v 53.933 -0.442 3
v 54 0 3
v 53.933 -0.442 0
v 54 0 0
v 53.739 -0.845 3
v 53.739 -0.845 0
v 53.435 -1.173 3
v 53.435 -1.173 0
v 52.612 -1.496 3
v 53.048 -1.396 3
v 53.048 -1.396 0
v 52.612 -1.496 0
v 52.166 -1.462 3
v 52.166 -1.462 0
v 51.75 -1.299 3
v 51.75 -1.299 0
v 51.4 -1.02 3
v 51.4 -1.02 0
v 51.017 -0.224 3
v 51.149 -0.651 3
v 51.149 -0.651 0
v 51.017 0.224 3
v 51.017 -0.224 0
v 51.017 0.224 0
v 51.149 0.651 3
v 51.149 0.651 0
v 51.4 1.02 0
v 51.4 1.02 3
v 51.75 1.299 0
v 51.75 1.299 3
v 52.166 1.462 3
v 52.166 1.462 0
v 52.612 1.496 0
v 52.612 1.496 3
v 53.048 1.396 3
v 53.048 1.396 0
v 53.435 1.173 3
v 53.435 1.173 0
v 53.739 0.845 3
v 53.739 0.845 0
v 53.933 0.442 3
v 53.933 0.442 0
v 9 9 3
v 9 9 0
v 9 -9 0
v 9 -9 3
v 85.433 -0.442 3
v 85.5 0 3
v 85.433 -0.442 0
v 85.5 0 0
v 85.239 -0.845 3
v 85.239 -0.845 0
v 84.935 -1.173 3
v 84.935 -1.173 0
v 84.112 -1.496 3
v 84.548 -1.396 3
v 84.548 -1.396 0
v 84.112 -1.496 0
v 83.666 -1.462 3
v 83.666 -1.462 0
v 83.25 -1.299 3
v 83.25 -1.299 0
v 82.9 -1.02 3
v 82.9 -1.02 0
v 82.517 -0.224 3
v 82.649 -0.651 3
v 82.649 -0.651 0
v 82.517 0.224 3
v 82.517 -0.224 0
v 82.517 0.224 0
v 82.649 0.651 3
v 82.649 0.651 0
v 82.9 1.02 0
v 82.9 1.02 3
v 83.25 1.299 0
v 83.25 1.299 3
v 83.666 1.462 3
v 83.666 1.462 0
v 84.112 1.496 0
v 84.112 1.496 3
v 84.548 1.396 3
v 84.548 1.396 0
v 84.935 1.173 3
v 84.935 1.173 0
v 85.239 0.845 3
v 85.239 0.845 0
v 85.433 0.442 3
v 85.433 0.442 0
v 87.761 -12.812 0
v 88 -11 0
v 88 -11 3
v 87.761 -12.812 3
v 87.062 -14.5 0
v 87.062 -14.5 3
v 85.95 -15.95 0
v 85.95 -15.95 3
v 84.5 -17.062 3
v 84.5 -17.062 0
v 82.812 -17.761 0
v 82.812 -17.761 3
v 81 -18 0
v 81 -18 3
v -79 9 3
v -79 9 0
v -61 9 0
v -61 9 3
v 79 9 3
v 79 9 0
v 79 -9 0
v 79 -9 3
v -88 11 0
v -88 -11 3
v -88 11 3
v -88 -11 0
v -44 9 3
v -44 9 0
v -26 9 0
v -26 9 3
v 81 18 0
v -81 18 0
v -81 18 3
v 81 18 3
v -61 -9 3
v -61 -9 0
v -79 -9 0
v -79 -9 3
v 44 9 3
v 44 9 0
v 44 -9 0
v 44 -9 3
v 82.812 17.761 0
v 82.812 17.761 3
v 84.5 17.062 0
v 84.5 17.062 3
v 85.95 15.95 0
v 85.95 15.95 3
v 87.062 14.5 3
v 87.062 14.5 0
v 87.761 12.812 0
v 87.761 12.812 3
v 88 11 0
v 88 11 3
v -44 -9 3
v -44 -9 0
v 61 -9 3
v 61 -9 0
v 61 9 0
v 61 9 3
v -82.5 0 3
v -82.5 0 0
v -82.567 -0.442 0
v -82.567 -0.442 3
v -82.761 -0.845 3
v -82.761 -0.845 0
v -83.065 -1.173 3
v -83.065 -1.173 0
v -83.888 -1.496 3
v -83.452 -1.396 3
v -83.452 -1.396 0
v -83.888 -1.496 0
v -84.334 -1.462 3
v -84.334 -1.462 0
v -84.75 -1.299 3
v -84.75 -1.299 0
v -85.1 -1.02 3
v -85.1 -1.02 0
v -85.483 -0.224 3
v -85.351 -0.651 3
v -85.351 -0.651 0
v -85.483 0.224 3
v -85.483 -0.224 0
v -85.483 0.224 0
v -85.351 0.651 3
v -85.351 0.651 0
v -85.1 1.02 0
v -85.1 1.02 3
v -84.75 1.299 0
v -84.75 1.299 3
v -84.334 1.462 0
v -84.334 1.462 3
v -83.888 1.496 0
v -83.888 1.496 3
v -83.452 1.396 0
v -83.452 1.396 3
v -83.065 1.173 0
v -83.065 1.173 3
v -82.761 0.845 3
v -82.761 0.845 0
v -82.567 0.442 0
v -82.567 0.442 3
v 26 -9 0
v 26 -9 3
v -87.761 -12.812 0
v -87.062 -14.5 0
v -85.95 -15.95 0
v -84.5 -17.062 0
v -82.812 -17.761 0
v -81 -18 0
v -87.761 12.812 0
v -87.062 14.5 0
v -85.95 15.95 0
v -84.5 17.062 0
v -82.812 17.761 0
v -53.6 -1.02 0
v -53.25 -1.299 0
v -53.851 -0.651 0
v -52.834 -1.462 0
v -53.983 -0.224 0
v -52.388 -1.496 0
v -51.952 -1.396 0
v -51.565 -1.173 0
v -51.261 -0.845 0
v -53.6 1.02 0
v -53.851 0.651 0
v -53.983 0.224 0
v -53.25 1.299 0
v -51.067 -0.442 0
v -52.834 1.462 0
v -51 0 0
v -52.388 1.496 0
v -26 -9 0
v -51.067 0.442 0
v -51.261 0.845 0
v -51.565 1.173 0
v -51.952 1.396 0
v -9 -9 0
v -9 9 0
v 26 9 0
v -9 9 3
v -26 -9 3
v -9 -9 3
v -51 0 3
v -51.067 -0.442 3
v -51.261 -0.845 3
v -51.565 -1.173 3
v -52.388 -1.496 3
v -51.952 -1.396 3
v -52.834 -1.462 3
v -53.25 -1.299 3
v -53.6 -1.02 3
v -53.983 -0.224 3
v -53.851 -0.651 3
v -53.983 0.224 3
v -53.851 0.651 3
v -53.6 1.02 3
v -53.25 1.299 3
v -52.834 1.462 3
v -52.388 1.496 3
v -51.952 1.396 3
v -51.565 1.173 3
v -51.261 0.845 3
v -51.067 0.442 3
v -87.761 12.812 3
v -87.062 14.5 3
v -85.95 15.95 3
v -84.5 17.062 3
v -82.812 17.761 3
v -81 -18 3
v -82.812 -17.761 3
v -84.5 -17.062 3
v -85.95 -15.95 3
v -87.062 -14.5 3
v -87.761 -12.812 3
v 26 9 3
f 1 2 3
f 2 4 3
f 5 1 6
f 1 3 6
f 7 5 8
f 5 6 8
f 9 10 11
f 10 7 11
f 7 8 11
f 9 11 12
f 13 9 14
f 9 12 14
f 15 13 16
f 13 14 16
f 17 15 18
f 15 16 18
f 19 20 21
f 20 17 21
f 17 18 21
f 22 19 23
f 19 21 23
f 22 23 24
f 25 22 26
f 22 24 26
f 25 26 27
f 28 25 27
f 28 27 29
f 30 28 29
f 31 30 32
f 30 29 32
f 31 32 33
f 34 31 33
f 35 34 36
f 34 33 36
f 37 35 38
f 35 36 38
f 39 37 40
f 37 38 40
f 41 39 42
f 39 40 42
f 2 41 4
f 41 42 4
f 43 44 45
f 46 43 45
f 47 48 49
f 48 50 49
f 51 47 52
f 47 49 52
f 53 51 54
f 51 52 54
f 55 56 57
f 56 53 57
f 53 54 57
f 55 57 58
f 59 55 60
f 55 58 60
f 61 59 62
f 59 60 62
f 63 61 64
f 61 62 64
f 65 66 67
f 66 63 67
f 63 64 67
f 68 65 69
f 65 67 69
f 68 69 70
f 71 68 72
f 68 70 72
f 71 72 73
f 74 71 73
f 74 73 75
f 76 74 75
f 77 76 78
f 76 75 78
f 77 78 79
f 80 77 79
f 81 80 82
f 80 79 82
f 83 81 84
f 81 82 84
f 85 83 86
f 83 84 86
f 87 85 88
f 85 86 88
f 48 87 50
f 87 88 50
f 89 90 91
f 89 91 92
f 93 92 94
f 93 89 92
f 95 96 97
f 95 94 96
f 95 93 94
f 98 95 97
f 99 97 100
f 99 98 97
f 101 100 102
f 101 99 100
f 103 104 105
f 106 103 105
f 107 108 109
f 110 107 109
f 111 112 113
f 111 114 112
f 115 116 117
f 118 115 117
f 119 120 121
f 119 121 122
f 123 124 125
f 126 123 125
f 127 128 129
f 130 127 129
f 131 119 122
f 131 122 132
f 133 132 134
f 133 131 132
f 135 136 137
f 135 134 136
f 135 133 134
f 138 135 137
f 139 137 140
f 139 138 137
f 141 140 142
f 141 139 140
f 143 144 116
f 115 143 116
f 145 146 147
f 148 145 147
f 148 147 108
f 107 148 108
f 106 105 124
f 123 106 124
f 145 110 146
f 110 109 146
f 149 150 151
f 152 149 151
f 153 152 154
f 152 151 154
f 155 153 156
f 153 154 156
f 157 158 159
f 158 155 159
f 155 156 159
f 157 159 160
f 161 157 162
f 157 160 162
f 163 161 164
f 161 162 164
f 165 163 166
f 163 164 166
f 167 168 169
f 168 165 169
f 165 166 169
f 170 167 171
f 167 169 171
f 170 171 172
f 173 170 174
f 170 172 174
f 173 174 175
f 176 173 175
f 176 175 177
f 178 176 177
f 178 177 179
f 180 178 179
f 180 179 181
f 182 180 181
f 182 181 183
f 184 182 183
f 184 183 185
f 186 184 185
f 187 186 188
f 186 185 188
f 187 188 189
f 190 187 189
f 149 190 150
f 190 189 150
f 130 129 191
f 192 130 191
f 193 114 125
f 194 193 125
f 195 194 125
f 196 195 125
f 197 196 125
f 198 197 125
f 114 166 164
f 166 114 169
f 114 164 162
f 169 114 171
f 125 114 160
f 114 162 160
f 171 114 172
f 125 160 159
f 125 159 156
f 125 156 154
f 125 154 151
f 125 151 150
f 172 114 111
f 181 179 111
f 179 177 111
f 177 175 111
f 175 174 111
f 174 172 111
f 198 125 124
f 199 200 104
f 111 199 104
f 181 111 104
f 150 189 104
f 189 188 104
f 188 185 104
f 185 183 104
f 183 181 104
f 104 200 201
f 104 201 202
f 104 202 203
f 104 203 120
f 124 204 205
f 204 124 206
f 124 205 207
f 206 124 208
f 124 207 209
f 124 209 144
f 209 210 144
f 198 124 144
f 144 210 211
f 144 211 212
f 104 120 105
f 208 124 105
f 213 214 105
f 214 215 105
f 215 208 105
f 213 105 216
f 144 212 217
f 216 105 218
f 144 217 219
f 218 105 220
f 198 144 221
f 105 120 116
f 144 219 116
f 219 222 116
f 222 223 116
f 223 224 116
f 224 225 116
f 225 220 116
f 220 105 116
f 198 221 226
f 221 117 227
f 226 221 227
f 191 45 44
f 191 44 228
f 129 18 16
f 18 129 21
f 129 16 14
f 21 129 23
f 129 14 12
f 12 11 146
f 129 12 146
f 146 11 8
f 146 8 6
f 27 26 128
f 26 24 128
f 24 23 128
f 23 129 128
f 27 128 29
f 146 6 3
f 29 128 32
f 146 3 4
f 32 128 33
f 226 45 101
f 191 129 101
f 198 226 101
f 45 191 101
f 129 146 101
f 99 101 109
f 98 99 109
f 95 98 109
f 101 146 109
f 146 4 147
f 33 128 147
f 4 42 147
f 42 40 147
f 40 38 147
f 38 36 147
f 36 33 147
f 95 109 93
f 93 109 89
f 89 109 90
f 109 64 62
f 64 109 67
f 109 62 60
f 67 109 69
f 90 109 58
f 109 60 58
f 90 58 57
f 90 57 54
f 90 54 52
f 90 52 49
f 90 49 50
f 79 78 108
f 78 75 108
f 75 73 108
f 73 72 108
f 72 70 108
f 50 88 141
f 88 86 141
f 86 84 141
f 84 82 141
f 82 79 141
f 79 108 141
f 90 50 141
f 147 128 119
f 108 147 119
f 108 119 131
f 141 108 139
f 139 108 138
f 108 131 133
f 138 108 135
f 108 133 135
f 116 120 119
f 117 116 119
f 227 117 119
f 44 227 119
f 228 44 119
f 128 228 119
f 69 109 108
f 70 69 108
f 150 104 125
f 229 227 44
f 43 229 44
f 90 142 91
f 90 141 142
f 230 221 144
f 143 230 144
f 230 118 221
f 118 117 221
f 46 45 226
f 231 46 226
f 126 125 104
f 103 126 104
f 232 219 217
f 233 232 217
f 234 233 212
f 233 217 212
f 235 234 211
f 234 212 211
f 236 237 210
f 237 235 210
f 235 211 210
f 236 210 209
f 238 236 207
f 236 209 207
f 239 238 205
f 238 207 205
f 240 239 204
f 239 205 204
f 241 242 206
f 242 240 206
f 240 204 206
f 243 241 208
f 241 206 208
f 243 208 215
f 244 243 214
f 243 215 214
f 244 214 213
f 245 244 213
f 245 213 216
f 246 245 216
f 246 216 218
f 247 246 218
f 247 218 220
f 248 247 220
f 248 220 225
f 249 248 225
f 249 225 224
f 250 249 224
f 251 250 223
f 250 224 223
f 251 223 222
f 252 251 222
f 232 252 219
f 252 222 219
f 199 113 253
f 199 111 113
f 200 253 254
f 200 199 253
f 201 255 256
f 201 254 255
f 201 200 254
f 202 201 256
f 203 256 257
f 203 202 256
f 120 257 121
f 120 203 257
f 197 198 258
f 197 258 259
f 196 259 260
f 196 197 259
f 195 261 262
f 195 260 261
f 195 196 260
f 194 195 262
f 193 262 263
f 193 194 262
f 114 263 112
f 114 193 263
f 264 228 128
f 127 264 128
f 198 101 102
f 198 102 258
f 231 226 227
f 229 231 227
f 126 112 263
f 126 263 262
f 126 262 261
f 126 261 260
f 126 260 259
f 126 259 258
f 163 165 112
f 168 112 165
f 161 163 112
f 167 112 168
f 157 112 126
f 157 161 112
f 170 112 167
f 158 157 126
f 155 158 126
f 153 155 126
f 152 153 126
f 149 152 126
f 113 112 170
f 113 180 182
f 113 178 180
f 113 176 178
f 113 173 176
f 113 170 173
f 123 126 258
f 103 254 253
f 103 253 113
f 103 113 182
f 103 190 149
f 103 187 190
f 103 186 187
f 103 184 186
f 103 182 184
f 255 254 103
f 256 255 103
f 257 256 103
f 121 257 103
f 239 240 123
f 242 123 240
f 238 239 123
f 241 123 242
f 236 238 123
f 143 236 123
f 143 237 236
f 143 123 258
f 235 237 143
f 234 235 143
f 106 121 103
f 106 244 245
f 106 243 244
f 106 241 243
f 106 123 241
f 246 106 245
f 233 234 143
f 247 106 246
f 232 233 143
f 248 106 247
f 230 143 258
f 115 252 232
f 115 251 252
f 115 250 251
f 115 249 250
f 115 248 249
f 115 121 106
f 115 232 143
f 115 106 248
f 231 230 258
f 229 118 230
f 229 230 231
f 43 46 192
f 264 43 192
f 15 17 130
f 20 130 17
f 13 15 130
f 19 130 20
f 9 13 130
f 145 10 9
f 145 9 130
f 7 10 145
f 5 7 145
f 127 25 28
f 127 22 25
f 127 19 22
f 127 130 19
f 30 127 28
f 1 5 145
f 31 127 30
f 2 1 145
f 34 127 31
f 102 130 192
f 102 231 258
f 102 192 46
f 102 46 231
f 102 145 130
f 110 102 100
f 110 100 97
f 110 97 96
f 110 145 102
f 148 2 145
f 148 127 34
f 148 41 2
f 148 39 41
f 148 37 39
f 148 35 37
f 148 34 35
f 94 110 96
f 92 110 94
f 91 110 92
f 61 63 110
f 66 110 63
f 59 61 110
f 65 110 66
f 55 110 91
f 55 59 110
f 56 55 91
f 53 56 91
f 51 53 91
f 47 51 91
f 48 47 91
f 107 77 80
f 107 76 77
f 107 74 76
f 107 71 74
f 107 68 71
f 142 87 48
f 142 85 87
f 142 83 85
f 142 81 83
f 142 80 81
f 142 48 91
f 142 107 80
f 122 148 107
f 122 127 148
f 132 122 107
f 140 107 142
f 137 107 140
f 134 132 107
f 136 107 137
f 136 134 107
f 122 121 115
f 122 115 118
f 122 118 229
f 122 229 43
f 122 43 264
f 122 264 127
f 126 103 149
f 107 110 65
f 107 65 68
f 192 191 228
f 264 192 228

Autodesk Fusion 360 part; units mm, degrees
sketch "Sketch1" plane through (0, 0, 0) normal (0, 0, 1) x (1, 0, 0)
  line L0 (-9, 9) -> (9, 9)
  line L1 (9, 9) -> (9, -9)
  line L2 (9, -9) -> (-9, -9)
  line L3 (-9, -9) -> (-9, 9)
  line L4 (-9, 9) -> (9, -9) construction
  line L5 (9, 9) -> (-9, -9) construction
  line L6 (-81, 18) -> (81, 18)
  line L7 (88, 11) -> (88, -11)
  line L8 (81, -18) -> (-81, -18)
  line L9 (-88, -11) -> (-88, 11)
  line L10 (-88, 18) -> (88, -18) construction
  line L11 (88, 18) -> (-88, -18) construction
  arc A0 (-81, 18) -> (-88, 11) centre (-81, 11) ccw
  arc A1 (-88, -11) -> (-81, -18) centre (-81, -11) ccw
  arc A2 (81, -18) -> (88, -11) centre (81, -11) ccw
  arc A3 (88, 11) -> (81, 18) centre (81, 11) ccw
  line L12 (0, 0) -> (0, 18) construction
  circle A4 centre (-84, 0) radius 1.5
  line L13 (-79, 9) -> (-61, 9)
  line L14 (-79, -9) -> (-79, 9)
  line L15 (-61, -9) -> (-79, -9)
  line L16 (-61, 9) -> (-61, -9)
  line L17 (-44, 9) -> (-26, 9)
  line L18 (-44, -9) -> (-44, 9)
  line L19 (-26, -9) -> (-44, -9)
  line L20 (-26, 9) -> (-26, -9)
  line L21 (26, 9) -> (44, 9)
  line L22 (26, -9) -> (26, 9)
  line L23 (44, -9) -> (26, -9)
  line L24 (44, 9) -> (44, -9)
  line L25 (61, 9) -> (79, 9)
  line L26 (61, -9) -> (61, 9)
  line L27 (79, -9) -> (61, -9)
  line L28 (79, 9) -> (79, -9)
  circle A5 centre (84, 0) radius 1.5
  circle A6 centre (-52.5, 0) radius 1.5
  circle A7 centre (52.5, 0) radius 1.5
  dimension "d22" = 18
  dimension "d23" = 18
  dimension "d28" = 176
  dimension "d29" = 36
  dimension "d30" = 7
  dimension "d35" = 3
  dimension "d36" = 4
  dimension "d37" = 18
  dimension "d44" = 35
  dimension "d45" = 0
  dimension "d60" = 3
  dimension "d61" = 8.5
extrude "Extrude6" add sketch "Sketch1" along normal blind 3
equation "d44 = 17 mm + 18 mm"
equation "d61 = ( 17 / 2 ) * 1 mm"
